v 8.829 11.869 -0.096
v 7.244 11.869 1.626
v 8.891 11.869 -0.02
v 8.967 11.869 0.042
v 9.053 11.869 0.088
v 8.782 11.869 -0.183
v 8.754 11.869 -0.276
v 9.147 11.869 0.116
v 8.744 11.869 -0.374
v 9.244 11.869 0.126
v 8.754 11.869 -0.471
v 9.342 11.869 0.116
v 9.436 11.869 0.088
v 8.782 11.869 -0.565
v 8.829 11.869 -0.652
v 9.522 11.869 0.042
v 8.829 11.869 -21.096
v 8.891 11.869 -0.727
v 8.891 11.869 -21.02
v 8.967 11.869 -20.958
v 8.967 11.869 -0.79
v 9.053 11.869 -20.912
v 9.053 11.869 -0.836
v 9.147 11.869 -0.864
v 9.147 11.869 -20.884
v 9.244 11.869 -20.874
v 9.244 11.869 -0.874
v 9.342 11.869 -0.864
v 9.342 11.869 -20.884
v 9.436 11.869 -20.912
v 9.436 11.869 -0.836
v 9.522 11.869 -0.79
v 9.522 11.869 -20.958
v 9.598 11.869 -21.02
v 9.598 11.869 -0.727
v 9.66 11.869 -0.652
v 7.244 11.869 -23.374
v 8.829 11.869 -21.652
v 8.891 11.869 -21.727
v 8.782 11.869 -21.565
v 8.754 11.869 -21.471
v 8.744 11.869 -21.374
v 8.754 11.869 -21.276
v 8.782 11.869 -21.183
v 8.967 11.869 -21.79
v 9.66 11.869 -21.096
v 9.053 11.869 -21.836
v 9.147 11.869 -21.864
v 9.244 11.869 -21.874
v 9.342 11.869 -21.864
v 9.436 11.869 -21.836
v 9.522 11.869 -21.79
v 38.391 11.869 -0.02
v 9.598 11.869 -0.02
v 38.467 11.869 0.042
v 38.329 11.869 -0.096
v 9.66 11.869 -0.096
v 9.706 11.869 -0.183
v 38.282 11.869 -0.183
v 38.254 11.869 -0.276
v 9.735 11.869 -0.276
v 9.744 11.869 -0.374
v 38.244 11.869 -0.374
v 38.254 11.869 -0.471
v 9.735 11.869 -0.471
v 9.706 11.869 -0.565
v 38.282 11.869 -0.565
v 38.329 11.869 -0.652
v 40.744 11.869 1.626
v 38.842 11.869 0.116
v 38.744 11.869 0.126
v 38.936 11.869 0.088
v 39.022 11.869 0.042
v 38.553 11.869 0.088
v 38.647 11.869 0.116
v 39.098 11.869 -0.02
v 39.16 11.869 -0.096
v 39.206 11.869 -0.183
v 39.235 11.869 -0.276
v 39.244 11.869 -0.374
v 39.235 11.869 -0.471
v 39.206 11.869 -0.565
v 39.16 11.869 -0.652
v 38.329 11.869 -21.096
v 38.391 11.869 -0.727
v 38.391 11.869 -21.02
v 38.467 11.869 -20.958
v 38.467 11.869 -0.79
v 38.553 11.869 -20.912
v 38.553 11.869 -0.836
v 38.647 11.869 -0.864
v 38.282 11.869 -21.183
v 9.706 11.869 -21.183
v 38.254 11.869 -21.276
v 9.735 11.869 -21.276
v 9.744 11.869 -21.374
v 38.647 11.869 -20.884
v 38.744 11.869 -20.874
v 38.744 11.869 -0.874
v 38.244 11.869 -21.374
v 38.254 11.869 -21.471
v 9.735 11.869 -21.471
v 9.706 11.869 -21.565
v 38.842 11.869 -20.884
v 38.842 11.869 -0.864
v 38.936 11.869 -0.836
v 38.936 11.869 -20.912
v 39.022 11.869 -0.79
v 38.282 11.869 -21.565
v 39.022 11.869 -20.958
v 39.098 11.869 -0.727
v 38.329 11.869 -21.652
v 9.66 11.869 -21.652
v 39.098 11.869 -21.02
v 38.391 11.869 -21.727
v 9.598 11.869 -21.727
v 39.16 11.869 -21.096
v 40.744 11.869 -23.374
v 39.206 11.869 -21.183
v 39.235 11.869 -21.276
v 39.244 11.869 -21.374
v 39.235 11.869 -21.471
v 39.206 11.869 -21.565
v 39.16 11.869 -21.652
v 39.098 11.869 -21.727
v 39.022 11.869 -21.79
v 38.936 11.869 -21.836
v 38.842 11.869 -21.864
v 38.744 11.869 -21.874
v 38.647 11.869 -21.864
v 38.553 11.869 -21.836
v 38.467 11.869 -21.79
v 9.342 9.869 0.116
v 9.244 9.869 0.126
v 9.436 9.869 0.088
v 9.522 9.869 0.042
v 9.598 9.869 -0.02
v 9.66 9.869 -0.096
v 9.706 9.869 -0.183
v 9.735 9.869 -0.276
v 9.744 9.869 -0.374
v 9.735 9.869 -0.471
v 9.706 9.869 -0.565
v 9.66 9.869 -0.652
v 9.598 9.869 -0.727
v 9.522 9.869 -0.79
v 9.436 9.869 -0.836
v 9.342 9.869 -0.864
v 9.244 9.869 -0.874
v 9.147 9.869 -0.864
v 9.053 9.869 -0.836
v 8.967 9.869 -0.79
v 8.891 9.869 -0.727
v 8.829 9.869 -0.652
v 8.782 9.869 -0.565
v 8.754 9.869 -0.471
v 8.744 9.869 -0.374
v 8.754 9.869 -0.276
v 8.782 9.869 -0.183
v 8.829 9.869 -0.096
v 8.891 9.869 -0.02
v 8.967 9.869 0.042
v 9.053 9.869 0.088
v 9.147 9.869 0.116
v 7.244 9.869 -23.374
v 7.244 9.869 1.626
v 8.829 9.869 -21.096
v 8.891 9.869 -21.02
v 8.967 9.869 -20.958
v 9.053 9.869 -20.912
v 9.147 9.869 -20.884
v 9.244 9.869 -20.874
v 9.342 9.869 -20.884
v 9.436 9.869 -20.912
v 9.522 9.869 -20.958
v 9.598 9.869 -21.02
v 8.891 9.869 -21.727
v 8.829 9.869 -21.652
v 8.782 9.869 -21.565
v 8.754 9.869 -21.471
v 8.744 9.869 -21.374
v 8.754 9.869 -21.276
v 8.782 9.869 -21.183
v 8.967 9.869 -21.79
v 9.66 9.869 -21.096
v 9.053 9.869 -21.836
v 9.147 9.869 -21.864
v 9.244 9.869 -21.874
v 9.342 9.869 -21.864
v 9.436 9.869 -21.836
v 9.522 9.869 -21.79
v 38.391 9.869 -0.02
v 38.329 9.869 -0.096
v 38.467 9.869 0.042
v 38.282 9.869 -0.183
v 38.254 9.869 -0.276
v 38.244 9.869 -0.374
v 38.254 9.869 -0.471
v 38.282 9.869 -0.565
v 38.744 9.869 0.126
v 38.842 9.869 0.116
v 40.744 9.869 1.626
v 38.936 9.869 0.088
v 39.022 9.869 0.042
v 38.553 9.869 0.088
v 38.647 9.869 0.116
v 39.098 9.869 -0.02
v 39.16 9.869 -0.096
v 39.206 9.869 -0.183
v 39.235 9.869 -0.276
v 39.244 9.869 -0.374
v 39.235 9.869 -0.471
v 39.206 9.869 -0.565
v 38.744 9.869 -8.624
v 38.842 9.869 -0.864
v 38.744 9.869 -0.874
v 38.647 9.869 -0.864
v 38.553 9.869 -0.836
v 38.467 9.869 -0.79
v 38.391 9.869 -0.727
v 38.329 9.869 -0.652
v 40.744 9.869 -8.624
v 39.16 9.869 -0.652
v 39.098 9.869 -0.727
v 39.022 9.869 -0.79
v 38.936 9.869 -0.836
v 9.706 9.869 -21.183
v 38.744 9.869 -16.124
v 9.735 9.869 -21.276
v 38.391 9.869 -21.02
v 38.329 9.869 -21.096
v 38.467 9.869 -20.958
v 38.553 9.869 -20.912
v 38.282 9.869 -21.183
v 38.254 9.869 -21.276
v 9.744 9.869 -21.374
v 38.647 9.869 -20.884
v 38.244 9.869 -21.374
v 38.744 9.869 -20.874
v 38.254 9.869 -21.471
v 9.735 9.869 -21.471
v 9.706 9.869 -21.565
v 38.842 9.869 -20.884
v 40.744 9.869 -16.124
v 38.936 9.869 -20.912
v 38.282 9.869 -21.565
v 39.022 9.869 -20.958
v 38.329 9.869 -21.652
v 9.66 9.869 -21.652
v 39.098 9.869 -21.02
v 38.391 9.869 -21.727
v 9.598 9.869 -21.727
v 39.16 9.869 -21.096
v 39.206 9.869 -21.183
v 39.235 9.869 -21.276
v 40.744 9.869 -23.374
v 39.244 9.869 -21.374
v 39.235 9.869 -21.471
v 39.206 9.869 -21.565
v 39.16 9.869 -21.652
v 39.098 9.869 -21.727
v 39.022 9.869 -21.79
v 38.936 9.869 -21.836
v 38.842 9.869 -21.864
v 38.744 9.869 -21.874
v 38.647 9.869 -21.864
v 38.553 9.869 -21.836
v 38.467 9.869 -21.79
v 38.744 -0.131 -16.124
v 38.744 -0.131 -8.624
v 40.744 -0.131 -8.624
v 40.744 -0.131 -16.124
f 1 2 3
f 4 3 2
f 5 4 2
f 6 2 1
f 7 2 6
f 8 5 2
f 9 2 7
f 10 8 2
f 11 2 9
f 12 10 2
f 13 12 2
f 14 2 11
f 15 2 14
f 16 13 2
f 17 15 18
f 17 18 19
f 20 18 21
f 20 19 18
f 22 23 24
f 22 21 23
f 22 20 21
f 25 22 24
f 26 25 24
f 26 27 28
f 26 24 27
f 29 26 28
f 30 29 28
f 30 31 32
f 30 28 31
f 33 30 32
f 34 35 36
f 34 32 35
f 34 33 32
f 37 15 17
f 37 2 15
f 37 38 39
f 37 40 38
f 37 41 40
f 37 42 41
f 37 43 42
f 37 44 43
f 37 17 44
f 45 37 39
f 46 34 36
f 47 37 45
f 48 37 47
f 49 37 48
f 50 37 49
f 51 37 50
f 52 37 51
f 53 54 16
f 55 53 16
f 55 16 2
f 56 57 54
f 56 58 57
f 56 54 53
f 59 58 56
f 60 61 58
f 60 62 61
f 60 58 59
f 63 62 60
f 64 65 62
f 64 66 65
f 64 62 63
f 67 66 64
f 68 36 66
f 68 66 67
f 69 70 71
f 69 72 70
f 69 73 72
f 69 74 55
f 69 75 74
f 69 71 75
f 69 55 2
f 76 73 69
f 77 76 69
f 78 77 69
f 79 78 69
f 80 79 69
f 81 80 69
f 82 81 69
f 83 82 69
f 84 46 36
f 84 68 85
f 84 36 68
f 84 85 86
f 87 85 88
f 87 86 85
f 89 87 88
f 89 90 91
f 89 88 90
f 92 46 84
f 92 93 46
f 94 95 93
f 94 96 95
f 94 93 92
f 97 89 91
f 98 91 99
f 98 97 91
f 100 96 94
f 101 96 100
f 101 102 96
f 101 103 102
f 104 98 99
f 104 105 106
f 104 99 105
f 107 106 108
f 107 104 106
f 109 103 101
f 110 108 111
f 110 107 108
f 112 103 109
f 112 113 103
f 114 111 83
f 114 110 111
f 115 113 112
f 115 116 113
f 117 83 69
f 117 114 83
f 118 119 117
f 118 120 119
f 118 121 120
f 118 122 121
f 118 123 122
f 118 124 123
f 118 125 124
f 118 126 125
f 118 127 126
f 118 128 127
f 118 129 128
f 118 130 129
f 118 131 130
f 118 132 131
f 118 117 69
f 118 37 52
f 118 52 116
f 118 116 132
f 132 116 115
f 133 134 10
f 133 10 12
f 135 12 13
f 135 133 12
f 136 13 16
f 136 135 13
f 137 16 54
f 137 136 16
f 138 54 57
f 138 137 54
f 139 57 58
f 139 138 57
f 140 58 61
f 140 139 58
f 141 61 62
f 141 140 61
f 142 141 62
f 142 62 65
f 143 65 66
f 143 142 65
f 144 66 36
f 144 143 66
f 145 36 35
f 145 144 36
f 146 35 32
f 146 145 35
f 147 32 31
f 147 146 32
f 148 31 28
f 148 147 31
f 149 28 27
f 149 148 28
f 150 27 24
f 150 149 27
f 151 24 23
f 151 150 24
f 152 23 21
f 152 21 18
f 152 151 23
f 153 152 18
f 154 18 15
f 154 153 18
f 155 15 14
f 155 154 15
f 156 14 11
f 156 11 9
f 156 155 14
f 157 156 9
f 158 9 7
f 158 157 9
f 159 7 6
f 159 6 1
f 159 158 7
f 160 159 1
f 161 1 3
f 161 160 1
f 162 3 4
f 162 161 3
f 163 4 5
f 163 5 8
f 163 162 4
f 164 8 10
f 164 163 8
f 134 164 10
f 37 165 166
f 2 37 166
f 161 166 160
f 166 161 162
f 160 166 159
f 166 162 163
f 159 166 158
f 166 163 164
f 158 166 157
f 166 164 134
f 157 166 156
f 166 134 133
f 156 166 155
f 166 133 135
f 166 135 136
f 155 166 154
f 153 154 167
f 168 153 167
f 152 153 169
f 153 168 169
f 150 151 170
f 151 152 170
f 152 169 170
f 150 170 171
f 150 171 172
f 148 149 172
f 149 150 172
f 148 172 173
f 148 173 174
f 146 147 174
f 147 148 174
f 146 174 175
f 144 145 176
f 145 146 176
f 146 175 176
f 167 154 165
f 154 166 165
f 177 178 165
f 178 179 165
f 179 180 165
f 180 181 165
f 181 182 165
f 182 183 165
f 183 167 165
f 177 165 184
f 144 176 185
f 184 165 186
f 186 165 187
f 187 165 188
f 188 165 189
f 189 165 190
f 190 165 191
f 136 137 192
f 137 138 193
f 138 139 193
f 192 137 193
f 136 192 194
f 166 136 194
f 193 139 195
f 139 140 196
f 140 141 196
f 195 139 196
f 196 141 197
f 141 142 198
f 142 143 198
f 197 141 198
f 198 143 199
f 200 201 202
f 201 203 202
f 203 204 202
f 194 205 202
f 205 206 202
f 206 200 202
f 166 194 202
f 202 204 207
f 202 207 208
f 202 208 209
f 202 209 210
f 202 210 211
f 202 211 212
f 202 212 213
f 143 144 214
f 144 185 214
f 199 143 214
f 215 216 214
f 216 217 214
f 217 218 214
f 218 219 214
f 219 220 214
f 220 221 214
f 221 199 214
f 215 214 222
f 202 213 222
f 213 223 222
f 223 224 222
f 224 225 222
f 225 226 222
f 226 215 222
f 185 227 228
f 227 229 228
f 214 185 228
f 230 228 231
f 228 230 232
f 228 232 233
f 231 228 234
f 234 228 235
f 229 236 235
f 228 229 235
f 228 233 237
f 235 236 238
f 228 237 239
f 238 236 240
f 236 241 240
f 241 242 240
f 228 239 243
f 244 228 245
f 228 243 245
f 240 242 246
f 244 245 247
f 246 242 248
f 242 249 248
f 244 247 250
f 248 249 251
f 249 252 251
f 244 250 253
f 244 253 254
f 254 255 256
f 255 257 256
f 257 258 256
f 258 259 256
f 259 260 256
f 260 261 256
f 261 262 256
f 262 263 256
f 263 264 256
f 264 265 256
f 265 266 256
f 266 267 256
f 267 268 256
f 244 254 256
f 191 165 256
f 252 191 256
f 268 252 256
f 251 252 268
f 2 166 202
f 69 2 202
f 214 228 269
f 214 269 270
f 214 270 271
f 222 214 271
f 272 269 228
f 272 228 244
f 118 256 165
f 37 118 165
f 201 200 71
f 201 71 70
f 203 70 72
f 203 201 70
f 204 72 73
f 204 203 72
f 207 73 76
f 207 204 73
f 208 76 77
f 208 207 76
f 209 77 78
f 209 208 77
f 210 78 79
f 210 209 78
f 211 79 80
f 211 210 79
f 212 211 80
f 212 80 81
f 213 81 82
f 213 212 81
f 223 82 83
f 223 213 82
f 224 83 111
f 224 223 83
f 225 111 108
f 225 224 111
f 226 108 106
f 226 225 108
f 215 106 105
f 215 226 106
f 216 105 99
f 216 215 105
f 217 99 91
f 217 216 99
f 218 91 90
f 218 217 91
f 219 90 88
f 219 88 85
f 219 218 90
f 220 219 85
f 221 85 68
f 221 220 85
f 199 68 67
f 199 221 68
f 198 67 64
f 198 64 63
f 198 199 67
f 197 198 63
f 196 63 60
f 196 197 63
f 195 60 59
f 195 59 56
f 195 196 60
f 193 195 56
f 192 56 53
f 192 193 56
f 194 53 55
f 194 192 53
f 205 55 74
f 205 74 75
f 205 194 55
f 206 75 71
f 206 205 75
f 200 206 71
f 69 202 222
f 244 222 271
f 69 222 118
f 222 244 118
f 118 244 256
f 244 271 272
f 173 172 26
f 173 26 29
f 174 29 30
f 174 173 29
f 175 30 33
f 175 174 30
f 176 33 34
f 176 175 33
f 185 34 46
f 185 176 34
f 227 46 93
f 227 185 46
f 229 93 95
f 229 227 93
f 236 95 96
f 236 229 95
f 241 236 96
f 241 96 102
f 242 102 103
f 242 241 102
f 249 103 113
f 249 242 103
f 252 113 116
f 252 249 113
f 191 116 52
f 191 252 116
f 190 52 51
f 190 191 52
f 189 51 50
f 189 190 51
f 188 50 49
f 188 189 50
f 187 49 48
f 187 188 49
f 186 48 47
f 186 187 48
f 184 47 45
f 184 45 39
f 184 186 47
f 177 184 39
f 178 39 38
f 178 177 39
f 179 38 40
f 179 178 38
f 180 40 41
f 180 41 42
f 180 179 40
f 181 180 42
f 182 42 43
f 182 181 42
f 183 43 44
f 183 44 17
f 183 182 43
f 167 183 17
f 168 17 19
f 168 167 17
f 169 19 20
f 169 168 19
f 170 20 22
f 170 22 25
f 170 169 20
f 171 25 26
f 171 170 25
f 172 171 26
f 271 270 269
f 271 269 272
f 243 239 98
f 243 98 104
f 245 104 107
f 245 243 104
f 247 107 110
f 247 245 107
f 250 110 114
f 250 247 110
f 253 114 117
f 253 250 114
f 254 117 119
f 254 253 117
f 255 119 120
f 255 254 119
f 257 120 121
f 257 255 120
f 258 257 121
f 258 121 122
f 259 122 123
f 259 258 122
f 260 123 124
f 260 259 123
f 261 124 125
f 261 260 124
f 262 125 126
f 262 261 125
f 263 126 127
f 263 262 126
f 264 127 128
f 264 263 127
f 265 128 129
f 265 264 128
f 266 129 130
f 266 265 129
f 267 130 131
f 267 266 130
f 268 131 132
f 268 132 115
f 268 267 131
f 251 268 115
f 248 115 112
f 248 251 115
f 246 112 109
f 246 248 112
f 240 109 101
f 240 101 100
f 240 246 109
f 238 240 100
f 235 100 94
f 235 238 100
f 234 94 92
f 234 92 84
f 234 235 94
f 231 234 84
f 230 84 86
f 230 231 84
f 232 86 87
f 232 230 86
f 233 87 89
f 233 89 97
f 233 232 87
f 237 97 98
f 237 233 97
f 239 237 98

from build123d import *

# Parameters (mm, degrees)
SKETCH1_R           = 0.5
BOSS_EXTRUDE1_DEPTH = 2
SKETCH2_W           = 2
SKETCH2_H           = 7.5
BOSS_EXTRUDE2_DEPTH = 10


with BuildPart() as part:
    # Sketch1 → Boss-Extrude1 (new body)
    # profile 1 of 2: a face of its own
    with BuildSketch(Plane(origin=(0, 9.868787402, 0), x_dir=(1, 0, 0), z_dir=(0, 1, 0))):
        Polygon((40.744370356, 16.373895208), (40.744370356, 8.373895208), (38.744370356, 8.373895208), (38.744370356, 2.373895208), (36.744370356, 2.373895208), (36.744370356, 0.373895208), (11.244370356, 0.373895208), (11.244370356, 2.373895208), (9.244370356, 2.373895208), (9.244370356, 19.373895208), (11.244370356, 19.373895208), (11.244370356, 21.373895208), (36.744370356, 21.373895208), (36.744370356, 19.373895208), (38.744370356, 19.373895208), (38.744370356, 16.373895208), align=None)
    # profile 2 of 2: a face of its own
    with BuildSketch(Plane(origin=(0, 9.868787402, 0), x_dir=(1, 0, 0), z_dir=(0, 1, 0))):
        Polygon((40.744370356, 8.373895208), (38.744370356, 8.373895208), (38.744370356, 2.373895208), (36.744370356, 2.373895208), (36.744370356, 0.373895208), (11.244370356, 0.373895208), (11.244370356, 2.373895208), (9.244370356, 2.373895208), (9.244370356, 19.373895208), (11.244370356, 19.373895208), (11.244370356, 21.373895208), (36.744370356, 21.373895208), (36.744370356, 19.373895208), (38.744370356, 19.373895208), (38.744370356, 16.373895208), (40.744370356, 16.373895208), (40.744370356, 23.373895208), (7.244370356, 23.373895208), (7.244370356, -1.626104792), (40.744370356, -1.626104792), align=None)
        with Locations(Location((9.244370356, 21.373895208, 0), (0, 0, 270))):
            Circle(SKETCH1_R, mode=Mode.SUBTRACT)
        with Locations(Location((38.744370356, 0.373895208, 0), (0, 0, 270))):
            Circle(SKETCH1_R, mode=Mode.SUBTRACT)
        with Locations(Location((38.744370356, 21.373895208, 0), (0, 0, 270))):
            Circle(SKETCH1_R, mode=Mode.SUBTRACT)
        with Locations(Location((9.244370356, 0.373895208, 0), (0, 0, 270))):
            Circle(SKETCH1_R, mode=Mode.SUBTRACT)
    extrude(amount=BOSS_EXTRUDE1_DEPTH)

    # Sketch2 → Boss-Extrude2 (add)
    with BuildSketch(Plane.XZ.offset(-9.868787402)):
        with Locations((39.744370356, -12.373895208)):
            Rectangle(SKETCH2_W, SKETCH2_H)
    extrude(amount=BOSS_EXTRUDE2_DEPTH)


solid = part.part
